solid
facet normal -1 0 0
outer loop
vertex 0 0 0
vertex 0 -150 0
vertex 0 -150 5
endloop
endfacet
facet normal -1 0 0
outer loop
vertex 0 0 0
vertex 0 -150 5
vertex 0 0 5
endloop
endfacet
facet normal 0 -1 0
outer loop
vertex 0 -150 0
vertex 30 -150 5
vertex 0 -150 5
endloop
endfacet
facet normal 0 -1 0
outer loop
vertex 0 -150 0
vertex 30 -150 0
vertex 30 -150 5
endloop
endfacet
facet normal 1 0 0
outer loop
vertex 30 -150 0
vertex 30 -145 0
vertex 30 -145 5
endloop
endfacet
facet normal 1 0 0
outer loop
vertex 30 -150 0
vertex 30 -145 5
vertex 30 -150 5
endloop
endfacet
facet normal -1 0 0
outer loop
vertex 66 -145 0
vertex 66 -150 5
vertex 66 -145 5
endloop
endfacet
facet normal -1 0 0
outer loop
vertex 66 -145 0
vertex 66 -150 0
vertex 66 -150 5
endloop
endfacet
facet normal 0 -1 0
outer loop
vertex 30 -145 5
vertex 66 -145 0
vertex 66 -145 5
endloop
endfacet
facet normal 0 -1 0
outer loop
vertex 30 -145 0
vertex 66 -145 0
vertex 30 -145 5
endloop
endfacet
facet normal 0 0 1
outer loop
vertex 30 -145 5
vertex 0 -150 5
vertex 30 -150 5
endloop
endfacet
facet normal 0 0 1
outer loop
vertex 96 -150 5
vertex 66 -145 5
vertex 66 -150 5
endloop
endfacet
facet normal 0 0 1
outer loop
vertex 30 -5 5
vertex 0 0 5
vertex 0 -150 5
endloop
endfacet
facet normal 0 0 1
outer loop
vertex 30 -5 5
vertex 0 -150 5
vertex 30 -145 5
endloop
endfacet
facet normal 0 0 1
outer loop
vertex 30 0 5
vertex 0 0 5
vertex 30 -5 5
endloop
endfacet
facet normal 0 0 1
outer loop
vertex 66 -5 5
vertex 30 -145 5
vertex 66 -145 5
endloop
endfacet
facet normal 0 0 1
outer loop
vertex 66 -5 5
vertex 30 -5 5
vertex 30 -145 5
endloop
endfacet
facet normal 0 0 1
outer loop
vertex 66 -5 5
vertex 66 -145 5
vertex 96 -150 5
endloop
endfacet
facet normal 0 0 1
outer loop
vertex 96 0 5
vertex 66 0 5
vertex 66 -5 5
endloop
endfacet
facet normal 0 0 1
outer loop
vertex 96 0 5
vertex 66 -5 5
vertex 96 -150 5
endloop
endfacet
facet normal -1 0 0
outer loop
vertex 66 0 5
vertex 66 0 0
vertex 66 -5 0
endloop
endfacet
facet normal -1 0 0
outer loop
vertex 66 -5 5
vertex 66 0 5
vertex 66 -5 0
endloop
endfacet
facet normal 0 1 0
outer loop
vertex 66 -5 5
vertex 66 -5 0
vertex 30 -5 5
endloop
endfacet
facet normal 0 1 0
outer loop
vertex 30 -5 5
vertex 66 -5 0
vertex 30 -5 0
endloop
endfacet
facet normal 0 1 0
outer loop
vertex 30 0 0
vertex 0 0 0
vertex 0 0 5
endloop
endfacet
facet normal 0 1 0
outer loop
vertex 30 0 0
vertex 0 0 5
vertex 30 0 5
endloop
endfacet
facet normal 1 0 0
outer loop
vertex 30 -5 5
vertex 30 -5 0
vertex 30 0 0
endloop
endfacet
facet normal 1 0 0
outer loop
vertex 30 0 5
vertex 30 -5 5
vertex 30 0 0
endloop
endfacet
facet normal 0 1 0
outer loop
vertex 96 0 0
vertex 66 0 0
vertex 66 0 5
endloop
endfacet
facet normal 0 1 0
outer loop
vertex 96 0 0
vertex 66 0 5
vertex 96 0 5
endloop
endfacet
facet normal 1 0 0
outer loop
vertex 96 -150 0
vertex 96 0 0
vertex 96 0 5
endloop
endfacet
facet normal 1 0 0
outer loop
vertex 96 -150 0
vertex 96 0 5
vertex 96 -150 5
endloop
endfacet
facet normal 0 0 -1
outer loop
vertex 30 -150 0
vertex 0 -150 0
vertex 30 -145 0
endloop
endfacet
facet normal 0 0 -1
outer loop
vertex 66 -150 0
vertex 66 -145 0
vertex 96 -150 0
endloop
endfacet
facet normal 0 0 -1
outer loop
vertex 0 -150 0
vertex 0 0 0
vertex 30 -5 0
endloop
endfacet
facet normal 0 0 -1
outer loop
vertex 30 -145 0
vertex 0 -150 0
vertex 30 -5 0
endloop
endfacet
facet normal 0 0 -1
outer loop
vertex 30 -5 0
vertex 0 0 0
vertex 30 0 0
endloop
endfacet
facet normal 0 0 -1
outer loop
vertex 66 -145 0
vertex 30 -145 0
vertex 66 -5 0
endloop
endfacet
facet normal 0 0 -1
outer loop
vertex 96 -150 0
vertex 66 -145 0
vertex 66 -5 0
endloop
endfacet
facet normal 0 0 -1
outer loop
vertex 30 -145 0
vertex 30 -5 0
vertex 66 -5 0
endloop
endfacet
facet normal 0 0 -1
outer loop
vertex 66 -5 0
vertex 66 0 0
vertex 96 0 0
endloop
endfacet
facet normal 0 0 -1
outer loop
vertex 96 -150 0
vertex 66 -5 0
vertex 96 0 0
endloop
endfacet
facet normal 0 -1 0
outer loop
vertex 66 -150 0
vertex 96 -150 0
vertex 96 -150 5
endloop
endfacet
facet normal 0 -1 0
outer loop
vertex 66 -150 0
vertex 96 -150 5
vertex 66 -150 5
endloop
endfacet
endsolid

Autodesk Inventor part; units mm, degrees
ref_plane "YZ Plane" through (0, 0, 0) normal (1, 0, 0) x (0, 1, 0)
ref_plane "XZ Plane" through (0, 0, 0) normal (0, 1, 0) x (-1, 0, 0)
ref_plane "XY Plane" through (0, 0, 0) normal (0, 0, 1) x (1, 0, 0)
sketch "Sketch1" plane through (0, 0, 0) normal (0, 0, 1) x (1, 0, 0)
  line L0 (0, 2.8582) -> (0, -2.8582) construction
  line L1 (-5.7775, 0) -> (5.7775, 0) construction
  line L2 (0, 0) -> (96, 0)
  line L3 (96, 0) -> (96, -150)
  line L4 (96, -150) -> (0, -150)
  line L5 (0, -150) -> (0, 0)
  line L6 (0, 0) -> (30, 0)
  line L7 (30, 0) -> (66, 0)
  line L8 (0, -150) -> (30, -150)
  line L9 (30, 0) -> (66, 0)
  line L10 (66, 0) -> (66, -5)
  line L11 (66, -5) -> (30, -5)
  line L12 (30, -5) -> (30, 0)
  line L13 (30, -150) -> (66, -150)
  line L14 (66, -150) -> (66, -145)
  line L15 (66, -145) -> (30, -145)
  line L16 (30, -145) -> (30, -150)
  point P0 (66, 0)
  dimension "d1" = 96
  dimension "d2" = 150
  dimension "d3" = 30
  dimension "d5" = 30
  dimension "d7" = 36
  dimension "d8" = 5
  dimension "d9" = 36
  dimension "d10" = 5
  dimension "d13" = 30
extrude "Extrusion1" add sketch "Sketch1" along normal blind 5 contours L2 L12 L11 L10 L3 L4 L14 L15 L16 L5
properties part number "schuine plaat" material "S235"
